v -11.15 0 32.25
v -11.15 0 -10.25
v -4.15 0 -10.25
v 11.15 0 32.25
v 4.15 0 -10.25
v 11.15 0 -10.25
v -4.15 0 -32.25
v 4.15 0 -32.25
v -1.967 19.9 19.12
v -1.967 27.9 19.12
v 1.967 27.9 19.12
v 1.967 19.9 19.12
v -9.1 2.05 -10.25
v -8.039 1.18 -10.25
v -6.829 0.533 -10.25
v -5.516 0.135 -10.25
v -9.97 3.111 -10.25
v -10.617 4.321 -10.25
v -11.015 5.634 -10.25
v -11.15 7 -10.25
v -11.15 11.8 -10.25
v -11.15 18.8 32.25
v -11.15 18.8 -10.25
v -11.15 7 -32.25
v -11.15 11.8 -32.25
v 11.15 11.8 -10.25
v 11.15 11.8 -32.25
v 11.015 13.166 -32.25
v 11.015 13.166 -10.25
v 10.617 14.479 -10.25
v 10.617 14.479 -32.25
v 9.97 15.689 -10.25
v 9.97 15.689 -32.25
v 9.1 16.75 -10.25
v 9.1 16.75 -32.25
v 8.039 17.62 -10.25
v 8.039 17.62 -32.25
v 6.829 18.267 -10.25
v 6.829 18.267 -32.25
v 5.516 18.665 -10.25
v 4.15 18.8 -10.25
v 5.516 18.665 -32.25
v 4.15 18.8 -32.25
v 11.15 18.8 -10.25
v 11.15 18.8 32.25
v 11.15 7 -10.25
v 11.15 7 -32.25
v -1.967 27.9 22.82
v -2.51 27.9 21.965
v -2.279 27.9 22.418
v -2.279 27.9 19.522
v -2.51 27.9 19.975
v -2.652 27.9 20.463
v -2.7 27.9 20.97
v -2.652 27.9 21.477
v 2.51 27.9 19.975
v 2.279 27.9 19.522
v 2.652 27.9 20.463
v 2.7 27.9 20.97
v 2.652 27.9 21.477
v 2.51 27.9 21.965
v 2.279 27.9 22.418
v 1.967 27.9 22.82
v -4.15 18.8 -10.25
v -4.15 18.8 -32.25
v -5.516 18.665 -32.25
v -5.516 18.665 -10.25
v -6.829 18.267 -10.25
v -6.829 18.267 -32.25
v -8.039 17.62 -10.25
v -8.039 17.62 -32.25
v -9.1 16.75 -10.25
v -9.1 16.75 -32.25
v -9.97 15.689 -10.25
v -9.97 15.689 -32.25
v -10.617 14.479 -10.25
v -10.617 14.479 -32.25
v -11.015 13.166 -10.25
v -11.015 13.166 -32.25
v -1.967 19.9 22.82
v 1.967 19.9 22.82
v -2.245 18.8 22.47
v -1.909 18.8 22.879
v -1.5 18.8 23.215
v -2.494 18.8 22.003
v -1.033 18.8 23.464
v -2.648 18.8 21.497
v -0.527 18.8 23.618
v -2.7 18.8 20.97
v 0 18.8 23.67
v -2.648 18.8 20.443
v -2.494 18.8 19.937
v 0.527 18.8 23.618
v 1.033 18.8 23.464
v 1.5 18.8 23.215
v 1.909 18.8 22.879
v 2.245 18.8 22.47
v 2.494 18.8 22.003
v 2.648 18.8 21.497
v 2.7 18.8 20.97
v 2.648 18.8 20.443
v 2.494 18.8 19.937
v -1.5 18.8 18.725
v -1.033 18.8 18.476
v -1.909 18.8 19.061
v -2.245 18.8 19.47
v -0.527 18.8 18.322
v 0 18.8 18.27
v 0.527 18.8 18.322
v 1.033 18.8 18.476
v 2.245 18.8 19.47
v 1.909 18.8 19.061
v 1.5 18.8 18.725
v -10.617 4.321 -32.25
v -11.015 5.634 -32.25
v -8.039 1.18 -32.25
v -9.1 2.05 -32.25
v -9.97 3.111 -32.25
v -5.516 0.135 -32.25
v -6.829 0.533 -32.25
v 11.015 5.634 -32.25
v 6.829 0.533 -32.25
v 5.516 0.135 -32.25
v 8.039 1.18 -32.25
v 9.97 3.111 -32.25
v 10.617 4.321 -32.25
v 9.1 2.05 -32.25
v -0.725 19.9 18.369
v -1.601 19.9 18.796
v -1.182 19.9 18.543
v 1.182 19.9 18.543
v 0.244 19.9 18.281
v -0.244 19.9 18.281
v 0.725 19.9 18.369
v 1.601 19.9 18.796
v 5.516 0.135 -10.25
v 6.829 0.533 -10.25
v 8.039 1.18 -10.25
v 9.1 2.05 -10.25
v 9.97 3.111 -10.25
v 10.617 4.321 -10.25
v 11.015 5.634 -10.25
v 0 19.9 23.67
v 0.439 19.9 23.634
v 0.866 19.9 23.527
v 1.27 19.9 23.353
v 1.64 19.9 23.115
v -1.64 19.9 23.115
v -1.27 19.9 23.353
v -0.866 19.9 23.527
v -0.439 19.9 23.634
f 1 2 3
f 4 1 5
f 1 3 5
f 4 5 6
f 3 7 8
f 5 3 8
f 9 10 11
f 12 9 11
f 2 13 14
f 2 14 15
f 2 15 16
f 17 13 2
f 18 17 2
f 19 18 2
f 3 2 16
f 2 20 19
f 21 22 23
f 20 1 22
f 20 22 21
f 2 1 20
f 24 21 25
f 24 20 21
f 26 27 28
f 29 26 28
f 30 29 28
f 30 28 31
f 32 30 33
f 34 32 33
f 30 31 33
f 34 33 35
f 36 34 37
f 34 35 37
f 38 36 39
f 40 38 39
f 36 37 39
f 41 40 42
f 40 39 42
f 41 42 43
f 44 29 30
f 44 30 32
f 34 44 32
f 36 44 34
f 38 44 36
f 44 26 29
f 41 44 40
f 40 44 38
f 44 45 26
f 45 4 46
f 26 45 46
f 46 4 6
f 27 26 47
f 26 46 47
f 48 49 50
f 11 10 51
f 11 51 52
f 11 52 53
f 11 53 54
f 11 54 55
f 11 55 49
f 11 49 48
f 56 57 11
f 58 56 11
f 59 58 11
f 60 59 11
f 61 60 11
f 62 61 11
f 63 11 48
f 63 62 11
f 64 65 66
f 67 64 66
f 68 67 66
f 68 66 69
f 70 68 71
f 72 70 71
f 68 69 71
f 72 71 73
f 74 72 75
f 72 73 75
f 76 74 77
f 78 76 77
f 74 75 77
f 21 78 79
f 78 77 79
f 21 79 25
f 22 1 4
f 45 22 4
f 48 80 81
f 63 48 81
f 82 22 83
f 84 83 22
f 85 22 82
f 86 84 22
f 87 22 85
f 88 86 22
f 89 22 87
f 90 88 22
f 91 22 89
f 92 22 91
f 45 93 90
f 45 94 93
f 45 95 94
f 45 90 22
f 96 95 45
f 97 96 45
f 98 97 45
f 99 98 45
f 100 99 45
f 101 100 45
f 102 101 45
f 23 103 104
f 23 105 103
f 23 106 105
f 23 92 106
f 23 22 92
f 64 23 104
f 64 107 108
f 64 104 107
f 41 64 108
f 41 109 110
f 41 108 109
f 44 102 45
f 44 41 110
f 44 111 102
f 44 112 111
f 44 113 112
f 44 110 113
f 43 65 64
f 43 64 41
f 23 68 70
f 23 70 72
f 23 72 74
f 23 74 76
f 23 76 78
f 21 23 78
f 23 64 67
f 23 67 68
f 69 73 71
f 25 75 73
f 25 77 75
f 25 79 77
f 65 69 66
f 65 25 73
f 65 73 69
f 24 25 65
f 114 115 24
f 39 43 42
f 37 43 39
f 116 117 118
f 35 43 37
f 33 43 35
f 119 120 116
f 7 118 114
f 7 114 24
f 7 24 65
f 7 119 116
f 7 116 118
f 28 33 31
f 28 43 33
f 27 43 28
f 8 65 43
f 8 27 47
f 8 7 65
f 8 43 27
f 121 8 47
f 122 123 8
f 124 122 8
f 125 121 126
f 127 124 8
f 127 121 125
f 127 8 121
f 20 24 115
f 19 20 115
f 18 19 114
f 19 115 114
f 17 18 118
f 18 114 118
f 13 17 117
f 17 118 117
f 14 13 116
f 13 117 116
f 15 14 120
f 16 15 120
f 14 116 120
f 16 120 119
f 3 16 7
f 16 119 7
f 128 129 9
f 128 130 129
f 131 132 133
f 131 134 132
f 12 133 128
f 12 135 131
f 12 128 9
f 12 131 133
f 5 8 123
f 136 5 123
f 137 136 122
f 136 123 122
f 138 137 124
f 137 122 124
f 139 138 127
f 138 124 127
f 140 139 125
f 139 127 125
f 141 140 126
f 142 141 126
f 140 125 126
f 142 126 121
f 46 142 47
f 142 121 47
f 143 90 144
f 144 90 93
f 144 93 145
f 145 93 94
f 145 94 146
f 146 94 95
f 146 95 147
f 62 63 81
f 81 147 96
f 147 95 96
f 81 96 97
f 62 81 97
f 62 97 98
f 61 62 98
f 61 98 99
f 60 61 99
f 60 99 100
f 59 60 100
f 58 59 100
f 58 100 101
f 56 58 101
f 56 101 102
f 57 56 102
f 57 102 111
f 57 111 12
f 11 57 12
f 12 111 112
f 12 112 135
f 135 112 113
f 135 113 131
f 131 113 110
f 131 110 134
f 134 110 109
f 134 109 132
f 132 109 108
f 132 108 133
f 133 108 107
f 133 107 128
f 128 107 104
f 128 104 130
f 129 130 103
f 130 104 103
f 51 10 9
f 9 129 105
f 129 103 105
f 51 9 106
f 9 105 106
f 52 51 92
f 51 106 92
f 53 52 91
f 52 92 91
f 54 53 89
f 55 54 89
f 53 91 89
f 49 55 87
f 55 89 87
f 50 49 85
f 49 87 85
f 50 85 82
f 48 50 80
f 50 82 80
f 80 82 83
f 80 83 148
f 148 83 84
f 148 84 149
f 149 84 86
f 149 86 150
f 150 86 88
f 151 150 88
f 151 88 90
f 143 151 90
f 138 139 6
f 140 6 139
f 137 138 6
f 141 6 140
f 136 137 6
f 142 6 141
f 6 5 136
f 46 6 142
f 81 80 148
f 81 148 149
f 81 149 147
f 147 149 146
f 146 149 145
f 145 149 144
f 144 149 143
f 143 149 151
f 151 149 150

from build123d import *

# Parameters (mm, degrees)
SKETCH_1_W          = 22.3
SKETCH_1_H          = 64.5
EXTRUDE_1_DEPTH     = 18.8
SKETCH_2_R          = 2.7
EXTRUDE_2_DEPTH     = 9.1
SKETCH_3_W          = 7.709030296
SKETCH_3_H          = 1.42648476
SKETCH_3_H_2        = 1.599270141
CUT_EXTRUDE_1_DEPTH = 8
CUT_EXTRUDE_2_DEPTH = 22


with BuildPart() as part:
    # 草图1 → 凸台-拉伸1 (new body)
    with BuildSketch(Plane(origin=(0, 0, 0), x_dir=(1, 0, 0), z_dir=(0, 1, 0))):
        Rectangle(SKETCH_1_W, SKETCH_1_H)
    extrude(amount=EXTRUDE_1_DEPTH)

    # 草图2 → 凸台-拉伸2 (add)
    with BuildSketch(Plane(origin=(0, 18.8, 0), x_dir=(1, 0, 0), z_dir=(0, 1, 0))):
        with Locations(Location((0, -20.97, 0), (0, 0, 270))):
            Circle(SKETCH_2_R)
    extrude(amount=EXTRUDE_2_DEPTH)

    # 草图3 → 切除-拉伸1 (cut)
    with BuildSketch(Plane(origin=(0, 27.9, 0), x_dir=(1, 0, 0), z_dir=(0, 1, 0))):
        with Locations((0, -18.40675762)):
            Rectangle(SKETCH_3_W, SKETCH_3_H)
        with Locations((0, -23.619635071)):
            Rectangle(SKETCH_3_W, SKETCH_3_H_2)
    extrude(amount=-CUT_EXTRUDE_1_DEPTH, mode=Mode.SUBTRACT)

    # 草图4 → 切除-拉伸2 (cut)
    with BuildSketch(Plane(origin=(0, 0, -32.25), x_dir=(-1, 0, 0), z_dir=(0, 0, -1))):
        with BuildLine():
            ThreePointArc((11.15, 7), (9.099747468, 2.050252532), (4.15, 0))
            Line((4.15, 0), (11.15, 0))
            Line((11.15, 0), (11.15, 7))
        make_face()
        with BuildLine():
            ThreePointArc((4.15, 18.8), (9.099747468, 16.749747468), (11.15, 11.8))
            Line((11.15, 11.8), (11.15, 18.8))
            Line((11.15, 18.8), (4.15, 18.8))
        make_face()
        with BuildLine():
            Line((-11.15, 0), (-4.15, 0))
            ThreePointArc((-4.15, 0), (-9.099747468, 2.050252532), (-11.15, 7))
            Line((-11.15, 7), (-11.15, 0))
        make_face()
        with BuildLine():
            Line((-11.15, 18.8), (-11.15, 11.8))
            ThreePointArc((-11.15, 11.8), (-9.099747468, 16.749747468), (-4.15, 18.8))
            Line((-4.15, 18.8), (-11.15, 18.8))
        make_face()
    extrude(amount=-CUT_EXTRUDE_2_DEPTH, mode=Mode.SUBTRACT)


solid = part.part
